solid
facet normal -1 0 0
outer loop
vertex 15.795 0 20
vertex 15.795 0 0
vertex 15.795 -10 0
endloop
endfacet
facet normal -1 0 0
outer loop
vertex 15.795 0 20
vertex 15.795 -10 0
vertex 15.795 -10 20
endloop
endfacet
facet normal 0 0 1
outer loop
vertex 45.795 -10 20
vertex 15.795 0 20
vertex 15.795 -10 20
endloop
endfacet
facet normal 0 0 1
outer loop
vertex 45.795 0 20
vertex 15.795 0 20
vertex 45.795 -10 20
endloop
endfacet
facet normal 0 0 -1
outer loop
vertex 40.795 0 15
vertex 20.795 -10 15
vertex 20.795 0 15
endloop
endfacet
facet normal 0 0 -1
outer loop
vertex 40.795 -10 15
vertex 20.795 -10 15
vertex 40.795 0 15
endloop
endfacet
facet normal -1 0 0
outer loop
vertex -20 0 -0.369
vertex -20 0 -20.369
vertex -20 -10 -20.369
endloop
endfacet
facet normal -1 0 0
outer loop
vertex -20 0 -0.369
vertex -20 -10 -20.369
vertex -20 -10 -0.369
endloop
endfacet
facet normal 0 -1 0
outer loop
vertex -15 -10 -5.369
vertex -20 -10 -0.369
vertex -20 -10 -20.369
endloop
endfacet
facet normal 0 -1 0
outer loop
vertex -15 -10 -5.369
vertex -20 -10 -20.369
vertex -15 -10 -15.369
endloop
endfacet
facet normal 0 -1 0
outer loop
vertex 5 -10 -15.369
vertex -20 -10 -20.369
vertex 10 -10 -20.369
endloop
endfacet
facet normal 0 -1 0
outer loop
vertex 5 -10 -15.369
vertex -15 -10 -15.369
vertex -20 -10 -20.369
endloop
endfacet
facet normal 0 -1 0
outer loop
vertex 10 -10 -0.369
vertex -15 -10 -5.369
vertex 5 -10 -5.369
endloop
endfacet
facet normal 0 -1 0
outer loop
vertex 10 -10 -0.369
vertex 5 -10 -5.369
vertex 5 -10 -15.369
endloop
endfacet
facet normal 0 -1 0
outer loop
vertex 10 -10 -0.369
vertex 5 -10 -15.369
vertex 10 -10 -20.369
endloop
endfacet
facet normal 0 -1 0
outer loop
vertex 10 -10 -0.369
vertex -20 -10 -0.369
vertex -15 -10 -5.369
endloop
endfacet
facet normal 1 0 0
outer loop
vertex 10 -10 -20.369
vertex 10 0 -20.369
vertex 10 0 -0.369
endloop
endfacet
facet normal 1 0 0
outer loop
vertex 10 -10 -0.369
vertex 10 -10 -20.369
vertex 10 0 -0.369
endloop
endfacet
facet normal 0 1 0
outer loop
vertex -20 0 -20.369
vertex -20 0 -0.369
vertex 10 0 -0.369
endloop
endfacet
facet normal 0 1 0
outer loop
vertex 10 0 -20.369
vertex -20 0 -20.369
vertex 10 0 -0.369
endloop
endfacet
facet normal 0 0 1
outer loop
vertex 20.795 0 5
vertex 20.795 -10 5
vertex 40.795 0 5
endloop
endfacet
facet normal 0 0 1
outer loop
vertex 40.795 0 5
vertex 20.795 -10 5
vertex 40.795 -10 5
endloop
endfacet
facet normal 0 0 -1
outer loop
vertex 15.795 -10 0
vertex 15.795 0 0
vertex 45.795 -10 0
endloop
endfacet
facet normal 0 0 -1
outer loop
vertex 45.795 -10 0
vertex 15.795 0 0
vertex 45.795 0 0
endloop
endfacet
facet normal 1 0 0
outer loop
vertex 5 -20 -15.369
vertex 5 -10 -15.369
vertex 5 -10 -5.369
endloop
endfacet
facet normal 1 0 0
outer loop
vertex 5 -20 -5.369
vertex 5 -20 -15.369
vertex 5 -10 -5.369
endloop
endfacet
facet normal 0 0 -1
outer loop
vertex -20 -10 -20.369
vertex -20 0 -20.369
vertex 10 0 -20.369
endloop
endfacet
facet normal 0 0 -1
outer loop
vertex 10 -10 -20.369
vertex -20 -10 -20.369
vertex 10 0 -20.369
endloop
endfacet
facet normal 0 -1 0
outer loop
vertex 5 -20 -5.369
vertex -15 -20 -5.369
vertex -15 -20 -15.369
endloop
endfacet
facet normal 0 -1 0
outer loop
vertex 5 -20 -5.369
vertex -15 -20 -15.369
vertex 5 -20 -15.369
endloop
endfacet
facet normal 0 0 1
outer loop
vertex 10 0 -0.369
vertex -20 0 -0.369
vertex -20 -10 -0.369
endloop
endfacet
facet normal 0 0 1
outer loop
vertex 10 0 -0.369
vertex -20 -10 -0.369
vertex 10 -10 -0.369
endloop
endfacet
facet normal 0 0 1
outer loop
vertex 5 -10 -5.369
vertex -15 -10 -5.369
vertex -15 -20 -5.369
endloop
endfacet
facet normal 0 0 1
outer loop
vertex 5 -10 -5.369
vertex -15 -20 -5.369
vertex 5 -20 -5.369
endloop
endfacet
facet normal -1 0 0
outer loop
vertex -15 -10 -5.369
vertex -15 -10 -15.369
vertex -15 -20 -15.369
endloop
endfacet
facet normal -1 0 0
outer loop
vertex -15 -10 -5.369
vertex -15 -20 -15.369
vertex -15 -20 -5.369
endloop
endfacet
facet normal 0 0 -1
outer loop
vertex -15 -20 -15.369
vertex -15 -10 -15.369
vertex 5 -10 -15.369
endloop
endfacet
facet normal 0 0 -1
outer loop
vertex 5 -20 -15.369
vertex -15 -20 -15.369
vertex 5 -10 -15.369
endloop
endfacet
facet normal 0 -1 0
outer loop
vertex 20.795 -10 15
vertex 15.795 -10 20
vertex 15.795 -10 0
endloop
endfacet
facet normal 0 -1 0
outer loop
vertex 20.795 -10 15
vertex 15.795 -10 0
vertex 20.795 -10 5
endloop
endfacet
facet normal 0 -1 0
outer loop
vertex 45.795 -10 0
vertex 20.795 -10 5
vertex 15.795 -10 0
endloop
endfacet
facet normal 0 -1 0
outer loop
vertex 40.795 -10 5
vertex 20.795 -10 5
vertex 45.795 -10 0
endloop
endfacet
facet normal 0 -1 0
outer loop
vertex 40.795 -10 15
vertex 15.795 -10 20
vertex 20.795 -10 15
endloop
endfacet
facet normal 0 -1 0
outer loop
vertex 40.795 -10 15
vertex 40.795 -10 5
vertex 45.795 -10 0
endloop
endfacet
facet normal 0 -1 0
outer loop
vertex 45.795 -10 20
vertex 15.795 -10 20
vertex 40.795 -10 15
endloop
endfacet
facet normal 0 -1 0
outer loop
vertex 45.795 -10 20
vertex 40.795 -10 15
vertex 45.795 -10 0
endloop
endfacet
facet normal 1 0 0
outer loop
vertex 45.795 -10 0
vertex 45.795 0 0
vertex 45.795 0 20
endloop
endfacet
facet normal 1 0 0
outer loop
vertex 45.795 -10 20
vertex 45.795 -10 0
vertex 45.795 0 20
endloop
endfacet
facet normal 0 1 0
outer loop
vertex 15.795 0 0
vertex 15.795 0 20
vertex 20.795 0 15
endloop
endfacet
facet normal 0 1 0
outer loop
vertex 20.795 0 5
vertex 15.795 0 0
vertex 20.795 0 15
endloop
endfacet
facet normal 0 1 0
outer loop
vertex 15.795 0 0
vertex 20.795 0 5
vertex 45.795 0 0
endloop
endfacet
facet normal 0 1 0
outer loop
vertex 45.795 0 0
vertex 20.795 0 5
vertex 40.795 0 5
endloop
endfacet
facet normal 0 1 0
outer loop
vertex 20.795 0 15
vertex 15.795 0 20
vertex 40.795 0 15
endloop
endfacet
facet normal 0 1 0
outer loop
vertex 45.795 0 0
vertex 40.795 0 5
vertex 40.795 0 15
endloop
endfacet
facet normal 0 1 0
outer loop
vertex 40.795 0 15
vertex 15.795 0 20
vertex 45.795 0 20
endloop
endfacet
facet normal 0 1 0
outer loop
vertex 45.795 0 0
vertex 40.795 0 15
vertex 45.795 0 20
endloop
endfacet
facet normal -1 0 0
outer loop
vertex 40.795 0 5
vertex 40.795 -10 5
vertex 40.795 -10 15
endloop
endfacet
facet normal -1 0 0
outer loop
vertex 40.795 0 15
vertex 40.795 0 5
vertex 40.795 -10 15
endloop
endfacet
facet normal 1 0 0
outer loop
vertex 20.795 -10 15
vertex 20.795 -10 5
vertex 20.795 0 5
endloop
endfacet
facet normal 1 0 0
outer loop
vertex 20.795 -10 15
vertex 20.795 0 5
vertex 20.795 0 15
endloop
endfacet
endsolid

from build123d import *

# Parameters (mm, degrees)
F0_W     = 30
F0_H     = 20
F1_DEPTH = 10
F2_W     = 20
F2_H     = 10
F3_DEPTH = 10
F4_W     = 30
F4_H     = 20
F5_DEPTH = 10
F6_W     = 20
F6_H     = 10
F7_DEPTH = 10


with BuildPart() as f1:
    # F0 (on Front) → F1 (new body)
    with BuildSketch(Plane.XZ):
        with Locations((-5, -10.369213)):
            Rectangle(F0_W, F0_H)
    extrude(amount=F1_DEPTH)

    # F2 (on face) → F3 (join)
    with BuildSketch(Plane.XZ.offset(10)):
        with Locations((-5, -10.369213)):
            Rectangle(F2_W, F2_H)
    extrude(amount=F3_DEPTH)


with BuildPart() as f5:
    # F4 (on Front) → F5 (new body)
    with BuildSketch(Plane.XZ):
        with Locations((30.79485, 10)):
            Rectangle(F4_W, F4_H)
    extrude(amount=F5_DEPTH)

    # F6 (on face) → F7 (cut)
    with BuildSketch(Plane.XZ.offset(10)):
        with Locations((30.79485, 10)):
            Rectangle(F6_W, F6_H)
    extrude(amount=-F7_DEPTH, mode=Mode.SUBTRACT)


solid = Compound([f1.part, f5.part])
